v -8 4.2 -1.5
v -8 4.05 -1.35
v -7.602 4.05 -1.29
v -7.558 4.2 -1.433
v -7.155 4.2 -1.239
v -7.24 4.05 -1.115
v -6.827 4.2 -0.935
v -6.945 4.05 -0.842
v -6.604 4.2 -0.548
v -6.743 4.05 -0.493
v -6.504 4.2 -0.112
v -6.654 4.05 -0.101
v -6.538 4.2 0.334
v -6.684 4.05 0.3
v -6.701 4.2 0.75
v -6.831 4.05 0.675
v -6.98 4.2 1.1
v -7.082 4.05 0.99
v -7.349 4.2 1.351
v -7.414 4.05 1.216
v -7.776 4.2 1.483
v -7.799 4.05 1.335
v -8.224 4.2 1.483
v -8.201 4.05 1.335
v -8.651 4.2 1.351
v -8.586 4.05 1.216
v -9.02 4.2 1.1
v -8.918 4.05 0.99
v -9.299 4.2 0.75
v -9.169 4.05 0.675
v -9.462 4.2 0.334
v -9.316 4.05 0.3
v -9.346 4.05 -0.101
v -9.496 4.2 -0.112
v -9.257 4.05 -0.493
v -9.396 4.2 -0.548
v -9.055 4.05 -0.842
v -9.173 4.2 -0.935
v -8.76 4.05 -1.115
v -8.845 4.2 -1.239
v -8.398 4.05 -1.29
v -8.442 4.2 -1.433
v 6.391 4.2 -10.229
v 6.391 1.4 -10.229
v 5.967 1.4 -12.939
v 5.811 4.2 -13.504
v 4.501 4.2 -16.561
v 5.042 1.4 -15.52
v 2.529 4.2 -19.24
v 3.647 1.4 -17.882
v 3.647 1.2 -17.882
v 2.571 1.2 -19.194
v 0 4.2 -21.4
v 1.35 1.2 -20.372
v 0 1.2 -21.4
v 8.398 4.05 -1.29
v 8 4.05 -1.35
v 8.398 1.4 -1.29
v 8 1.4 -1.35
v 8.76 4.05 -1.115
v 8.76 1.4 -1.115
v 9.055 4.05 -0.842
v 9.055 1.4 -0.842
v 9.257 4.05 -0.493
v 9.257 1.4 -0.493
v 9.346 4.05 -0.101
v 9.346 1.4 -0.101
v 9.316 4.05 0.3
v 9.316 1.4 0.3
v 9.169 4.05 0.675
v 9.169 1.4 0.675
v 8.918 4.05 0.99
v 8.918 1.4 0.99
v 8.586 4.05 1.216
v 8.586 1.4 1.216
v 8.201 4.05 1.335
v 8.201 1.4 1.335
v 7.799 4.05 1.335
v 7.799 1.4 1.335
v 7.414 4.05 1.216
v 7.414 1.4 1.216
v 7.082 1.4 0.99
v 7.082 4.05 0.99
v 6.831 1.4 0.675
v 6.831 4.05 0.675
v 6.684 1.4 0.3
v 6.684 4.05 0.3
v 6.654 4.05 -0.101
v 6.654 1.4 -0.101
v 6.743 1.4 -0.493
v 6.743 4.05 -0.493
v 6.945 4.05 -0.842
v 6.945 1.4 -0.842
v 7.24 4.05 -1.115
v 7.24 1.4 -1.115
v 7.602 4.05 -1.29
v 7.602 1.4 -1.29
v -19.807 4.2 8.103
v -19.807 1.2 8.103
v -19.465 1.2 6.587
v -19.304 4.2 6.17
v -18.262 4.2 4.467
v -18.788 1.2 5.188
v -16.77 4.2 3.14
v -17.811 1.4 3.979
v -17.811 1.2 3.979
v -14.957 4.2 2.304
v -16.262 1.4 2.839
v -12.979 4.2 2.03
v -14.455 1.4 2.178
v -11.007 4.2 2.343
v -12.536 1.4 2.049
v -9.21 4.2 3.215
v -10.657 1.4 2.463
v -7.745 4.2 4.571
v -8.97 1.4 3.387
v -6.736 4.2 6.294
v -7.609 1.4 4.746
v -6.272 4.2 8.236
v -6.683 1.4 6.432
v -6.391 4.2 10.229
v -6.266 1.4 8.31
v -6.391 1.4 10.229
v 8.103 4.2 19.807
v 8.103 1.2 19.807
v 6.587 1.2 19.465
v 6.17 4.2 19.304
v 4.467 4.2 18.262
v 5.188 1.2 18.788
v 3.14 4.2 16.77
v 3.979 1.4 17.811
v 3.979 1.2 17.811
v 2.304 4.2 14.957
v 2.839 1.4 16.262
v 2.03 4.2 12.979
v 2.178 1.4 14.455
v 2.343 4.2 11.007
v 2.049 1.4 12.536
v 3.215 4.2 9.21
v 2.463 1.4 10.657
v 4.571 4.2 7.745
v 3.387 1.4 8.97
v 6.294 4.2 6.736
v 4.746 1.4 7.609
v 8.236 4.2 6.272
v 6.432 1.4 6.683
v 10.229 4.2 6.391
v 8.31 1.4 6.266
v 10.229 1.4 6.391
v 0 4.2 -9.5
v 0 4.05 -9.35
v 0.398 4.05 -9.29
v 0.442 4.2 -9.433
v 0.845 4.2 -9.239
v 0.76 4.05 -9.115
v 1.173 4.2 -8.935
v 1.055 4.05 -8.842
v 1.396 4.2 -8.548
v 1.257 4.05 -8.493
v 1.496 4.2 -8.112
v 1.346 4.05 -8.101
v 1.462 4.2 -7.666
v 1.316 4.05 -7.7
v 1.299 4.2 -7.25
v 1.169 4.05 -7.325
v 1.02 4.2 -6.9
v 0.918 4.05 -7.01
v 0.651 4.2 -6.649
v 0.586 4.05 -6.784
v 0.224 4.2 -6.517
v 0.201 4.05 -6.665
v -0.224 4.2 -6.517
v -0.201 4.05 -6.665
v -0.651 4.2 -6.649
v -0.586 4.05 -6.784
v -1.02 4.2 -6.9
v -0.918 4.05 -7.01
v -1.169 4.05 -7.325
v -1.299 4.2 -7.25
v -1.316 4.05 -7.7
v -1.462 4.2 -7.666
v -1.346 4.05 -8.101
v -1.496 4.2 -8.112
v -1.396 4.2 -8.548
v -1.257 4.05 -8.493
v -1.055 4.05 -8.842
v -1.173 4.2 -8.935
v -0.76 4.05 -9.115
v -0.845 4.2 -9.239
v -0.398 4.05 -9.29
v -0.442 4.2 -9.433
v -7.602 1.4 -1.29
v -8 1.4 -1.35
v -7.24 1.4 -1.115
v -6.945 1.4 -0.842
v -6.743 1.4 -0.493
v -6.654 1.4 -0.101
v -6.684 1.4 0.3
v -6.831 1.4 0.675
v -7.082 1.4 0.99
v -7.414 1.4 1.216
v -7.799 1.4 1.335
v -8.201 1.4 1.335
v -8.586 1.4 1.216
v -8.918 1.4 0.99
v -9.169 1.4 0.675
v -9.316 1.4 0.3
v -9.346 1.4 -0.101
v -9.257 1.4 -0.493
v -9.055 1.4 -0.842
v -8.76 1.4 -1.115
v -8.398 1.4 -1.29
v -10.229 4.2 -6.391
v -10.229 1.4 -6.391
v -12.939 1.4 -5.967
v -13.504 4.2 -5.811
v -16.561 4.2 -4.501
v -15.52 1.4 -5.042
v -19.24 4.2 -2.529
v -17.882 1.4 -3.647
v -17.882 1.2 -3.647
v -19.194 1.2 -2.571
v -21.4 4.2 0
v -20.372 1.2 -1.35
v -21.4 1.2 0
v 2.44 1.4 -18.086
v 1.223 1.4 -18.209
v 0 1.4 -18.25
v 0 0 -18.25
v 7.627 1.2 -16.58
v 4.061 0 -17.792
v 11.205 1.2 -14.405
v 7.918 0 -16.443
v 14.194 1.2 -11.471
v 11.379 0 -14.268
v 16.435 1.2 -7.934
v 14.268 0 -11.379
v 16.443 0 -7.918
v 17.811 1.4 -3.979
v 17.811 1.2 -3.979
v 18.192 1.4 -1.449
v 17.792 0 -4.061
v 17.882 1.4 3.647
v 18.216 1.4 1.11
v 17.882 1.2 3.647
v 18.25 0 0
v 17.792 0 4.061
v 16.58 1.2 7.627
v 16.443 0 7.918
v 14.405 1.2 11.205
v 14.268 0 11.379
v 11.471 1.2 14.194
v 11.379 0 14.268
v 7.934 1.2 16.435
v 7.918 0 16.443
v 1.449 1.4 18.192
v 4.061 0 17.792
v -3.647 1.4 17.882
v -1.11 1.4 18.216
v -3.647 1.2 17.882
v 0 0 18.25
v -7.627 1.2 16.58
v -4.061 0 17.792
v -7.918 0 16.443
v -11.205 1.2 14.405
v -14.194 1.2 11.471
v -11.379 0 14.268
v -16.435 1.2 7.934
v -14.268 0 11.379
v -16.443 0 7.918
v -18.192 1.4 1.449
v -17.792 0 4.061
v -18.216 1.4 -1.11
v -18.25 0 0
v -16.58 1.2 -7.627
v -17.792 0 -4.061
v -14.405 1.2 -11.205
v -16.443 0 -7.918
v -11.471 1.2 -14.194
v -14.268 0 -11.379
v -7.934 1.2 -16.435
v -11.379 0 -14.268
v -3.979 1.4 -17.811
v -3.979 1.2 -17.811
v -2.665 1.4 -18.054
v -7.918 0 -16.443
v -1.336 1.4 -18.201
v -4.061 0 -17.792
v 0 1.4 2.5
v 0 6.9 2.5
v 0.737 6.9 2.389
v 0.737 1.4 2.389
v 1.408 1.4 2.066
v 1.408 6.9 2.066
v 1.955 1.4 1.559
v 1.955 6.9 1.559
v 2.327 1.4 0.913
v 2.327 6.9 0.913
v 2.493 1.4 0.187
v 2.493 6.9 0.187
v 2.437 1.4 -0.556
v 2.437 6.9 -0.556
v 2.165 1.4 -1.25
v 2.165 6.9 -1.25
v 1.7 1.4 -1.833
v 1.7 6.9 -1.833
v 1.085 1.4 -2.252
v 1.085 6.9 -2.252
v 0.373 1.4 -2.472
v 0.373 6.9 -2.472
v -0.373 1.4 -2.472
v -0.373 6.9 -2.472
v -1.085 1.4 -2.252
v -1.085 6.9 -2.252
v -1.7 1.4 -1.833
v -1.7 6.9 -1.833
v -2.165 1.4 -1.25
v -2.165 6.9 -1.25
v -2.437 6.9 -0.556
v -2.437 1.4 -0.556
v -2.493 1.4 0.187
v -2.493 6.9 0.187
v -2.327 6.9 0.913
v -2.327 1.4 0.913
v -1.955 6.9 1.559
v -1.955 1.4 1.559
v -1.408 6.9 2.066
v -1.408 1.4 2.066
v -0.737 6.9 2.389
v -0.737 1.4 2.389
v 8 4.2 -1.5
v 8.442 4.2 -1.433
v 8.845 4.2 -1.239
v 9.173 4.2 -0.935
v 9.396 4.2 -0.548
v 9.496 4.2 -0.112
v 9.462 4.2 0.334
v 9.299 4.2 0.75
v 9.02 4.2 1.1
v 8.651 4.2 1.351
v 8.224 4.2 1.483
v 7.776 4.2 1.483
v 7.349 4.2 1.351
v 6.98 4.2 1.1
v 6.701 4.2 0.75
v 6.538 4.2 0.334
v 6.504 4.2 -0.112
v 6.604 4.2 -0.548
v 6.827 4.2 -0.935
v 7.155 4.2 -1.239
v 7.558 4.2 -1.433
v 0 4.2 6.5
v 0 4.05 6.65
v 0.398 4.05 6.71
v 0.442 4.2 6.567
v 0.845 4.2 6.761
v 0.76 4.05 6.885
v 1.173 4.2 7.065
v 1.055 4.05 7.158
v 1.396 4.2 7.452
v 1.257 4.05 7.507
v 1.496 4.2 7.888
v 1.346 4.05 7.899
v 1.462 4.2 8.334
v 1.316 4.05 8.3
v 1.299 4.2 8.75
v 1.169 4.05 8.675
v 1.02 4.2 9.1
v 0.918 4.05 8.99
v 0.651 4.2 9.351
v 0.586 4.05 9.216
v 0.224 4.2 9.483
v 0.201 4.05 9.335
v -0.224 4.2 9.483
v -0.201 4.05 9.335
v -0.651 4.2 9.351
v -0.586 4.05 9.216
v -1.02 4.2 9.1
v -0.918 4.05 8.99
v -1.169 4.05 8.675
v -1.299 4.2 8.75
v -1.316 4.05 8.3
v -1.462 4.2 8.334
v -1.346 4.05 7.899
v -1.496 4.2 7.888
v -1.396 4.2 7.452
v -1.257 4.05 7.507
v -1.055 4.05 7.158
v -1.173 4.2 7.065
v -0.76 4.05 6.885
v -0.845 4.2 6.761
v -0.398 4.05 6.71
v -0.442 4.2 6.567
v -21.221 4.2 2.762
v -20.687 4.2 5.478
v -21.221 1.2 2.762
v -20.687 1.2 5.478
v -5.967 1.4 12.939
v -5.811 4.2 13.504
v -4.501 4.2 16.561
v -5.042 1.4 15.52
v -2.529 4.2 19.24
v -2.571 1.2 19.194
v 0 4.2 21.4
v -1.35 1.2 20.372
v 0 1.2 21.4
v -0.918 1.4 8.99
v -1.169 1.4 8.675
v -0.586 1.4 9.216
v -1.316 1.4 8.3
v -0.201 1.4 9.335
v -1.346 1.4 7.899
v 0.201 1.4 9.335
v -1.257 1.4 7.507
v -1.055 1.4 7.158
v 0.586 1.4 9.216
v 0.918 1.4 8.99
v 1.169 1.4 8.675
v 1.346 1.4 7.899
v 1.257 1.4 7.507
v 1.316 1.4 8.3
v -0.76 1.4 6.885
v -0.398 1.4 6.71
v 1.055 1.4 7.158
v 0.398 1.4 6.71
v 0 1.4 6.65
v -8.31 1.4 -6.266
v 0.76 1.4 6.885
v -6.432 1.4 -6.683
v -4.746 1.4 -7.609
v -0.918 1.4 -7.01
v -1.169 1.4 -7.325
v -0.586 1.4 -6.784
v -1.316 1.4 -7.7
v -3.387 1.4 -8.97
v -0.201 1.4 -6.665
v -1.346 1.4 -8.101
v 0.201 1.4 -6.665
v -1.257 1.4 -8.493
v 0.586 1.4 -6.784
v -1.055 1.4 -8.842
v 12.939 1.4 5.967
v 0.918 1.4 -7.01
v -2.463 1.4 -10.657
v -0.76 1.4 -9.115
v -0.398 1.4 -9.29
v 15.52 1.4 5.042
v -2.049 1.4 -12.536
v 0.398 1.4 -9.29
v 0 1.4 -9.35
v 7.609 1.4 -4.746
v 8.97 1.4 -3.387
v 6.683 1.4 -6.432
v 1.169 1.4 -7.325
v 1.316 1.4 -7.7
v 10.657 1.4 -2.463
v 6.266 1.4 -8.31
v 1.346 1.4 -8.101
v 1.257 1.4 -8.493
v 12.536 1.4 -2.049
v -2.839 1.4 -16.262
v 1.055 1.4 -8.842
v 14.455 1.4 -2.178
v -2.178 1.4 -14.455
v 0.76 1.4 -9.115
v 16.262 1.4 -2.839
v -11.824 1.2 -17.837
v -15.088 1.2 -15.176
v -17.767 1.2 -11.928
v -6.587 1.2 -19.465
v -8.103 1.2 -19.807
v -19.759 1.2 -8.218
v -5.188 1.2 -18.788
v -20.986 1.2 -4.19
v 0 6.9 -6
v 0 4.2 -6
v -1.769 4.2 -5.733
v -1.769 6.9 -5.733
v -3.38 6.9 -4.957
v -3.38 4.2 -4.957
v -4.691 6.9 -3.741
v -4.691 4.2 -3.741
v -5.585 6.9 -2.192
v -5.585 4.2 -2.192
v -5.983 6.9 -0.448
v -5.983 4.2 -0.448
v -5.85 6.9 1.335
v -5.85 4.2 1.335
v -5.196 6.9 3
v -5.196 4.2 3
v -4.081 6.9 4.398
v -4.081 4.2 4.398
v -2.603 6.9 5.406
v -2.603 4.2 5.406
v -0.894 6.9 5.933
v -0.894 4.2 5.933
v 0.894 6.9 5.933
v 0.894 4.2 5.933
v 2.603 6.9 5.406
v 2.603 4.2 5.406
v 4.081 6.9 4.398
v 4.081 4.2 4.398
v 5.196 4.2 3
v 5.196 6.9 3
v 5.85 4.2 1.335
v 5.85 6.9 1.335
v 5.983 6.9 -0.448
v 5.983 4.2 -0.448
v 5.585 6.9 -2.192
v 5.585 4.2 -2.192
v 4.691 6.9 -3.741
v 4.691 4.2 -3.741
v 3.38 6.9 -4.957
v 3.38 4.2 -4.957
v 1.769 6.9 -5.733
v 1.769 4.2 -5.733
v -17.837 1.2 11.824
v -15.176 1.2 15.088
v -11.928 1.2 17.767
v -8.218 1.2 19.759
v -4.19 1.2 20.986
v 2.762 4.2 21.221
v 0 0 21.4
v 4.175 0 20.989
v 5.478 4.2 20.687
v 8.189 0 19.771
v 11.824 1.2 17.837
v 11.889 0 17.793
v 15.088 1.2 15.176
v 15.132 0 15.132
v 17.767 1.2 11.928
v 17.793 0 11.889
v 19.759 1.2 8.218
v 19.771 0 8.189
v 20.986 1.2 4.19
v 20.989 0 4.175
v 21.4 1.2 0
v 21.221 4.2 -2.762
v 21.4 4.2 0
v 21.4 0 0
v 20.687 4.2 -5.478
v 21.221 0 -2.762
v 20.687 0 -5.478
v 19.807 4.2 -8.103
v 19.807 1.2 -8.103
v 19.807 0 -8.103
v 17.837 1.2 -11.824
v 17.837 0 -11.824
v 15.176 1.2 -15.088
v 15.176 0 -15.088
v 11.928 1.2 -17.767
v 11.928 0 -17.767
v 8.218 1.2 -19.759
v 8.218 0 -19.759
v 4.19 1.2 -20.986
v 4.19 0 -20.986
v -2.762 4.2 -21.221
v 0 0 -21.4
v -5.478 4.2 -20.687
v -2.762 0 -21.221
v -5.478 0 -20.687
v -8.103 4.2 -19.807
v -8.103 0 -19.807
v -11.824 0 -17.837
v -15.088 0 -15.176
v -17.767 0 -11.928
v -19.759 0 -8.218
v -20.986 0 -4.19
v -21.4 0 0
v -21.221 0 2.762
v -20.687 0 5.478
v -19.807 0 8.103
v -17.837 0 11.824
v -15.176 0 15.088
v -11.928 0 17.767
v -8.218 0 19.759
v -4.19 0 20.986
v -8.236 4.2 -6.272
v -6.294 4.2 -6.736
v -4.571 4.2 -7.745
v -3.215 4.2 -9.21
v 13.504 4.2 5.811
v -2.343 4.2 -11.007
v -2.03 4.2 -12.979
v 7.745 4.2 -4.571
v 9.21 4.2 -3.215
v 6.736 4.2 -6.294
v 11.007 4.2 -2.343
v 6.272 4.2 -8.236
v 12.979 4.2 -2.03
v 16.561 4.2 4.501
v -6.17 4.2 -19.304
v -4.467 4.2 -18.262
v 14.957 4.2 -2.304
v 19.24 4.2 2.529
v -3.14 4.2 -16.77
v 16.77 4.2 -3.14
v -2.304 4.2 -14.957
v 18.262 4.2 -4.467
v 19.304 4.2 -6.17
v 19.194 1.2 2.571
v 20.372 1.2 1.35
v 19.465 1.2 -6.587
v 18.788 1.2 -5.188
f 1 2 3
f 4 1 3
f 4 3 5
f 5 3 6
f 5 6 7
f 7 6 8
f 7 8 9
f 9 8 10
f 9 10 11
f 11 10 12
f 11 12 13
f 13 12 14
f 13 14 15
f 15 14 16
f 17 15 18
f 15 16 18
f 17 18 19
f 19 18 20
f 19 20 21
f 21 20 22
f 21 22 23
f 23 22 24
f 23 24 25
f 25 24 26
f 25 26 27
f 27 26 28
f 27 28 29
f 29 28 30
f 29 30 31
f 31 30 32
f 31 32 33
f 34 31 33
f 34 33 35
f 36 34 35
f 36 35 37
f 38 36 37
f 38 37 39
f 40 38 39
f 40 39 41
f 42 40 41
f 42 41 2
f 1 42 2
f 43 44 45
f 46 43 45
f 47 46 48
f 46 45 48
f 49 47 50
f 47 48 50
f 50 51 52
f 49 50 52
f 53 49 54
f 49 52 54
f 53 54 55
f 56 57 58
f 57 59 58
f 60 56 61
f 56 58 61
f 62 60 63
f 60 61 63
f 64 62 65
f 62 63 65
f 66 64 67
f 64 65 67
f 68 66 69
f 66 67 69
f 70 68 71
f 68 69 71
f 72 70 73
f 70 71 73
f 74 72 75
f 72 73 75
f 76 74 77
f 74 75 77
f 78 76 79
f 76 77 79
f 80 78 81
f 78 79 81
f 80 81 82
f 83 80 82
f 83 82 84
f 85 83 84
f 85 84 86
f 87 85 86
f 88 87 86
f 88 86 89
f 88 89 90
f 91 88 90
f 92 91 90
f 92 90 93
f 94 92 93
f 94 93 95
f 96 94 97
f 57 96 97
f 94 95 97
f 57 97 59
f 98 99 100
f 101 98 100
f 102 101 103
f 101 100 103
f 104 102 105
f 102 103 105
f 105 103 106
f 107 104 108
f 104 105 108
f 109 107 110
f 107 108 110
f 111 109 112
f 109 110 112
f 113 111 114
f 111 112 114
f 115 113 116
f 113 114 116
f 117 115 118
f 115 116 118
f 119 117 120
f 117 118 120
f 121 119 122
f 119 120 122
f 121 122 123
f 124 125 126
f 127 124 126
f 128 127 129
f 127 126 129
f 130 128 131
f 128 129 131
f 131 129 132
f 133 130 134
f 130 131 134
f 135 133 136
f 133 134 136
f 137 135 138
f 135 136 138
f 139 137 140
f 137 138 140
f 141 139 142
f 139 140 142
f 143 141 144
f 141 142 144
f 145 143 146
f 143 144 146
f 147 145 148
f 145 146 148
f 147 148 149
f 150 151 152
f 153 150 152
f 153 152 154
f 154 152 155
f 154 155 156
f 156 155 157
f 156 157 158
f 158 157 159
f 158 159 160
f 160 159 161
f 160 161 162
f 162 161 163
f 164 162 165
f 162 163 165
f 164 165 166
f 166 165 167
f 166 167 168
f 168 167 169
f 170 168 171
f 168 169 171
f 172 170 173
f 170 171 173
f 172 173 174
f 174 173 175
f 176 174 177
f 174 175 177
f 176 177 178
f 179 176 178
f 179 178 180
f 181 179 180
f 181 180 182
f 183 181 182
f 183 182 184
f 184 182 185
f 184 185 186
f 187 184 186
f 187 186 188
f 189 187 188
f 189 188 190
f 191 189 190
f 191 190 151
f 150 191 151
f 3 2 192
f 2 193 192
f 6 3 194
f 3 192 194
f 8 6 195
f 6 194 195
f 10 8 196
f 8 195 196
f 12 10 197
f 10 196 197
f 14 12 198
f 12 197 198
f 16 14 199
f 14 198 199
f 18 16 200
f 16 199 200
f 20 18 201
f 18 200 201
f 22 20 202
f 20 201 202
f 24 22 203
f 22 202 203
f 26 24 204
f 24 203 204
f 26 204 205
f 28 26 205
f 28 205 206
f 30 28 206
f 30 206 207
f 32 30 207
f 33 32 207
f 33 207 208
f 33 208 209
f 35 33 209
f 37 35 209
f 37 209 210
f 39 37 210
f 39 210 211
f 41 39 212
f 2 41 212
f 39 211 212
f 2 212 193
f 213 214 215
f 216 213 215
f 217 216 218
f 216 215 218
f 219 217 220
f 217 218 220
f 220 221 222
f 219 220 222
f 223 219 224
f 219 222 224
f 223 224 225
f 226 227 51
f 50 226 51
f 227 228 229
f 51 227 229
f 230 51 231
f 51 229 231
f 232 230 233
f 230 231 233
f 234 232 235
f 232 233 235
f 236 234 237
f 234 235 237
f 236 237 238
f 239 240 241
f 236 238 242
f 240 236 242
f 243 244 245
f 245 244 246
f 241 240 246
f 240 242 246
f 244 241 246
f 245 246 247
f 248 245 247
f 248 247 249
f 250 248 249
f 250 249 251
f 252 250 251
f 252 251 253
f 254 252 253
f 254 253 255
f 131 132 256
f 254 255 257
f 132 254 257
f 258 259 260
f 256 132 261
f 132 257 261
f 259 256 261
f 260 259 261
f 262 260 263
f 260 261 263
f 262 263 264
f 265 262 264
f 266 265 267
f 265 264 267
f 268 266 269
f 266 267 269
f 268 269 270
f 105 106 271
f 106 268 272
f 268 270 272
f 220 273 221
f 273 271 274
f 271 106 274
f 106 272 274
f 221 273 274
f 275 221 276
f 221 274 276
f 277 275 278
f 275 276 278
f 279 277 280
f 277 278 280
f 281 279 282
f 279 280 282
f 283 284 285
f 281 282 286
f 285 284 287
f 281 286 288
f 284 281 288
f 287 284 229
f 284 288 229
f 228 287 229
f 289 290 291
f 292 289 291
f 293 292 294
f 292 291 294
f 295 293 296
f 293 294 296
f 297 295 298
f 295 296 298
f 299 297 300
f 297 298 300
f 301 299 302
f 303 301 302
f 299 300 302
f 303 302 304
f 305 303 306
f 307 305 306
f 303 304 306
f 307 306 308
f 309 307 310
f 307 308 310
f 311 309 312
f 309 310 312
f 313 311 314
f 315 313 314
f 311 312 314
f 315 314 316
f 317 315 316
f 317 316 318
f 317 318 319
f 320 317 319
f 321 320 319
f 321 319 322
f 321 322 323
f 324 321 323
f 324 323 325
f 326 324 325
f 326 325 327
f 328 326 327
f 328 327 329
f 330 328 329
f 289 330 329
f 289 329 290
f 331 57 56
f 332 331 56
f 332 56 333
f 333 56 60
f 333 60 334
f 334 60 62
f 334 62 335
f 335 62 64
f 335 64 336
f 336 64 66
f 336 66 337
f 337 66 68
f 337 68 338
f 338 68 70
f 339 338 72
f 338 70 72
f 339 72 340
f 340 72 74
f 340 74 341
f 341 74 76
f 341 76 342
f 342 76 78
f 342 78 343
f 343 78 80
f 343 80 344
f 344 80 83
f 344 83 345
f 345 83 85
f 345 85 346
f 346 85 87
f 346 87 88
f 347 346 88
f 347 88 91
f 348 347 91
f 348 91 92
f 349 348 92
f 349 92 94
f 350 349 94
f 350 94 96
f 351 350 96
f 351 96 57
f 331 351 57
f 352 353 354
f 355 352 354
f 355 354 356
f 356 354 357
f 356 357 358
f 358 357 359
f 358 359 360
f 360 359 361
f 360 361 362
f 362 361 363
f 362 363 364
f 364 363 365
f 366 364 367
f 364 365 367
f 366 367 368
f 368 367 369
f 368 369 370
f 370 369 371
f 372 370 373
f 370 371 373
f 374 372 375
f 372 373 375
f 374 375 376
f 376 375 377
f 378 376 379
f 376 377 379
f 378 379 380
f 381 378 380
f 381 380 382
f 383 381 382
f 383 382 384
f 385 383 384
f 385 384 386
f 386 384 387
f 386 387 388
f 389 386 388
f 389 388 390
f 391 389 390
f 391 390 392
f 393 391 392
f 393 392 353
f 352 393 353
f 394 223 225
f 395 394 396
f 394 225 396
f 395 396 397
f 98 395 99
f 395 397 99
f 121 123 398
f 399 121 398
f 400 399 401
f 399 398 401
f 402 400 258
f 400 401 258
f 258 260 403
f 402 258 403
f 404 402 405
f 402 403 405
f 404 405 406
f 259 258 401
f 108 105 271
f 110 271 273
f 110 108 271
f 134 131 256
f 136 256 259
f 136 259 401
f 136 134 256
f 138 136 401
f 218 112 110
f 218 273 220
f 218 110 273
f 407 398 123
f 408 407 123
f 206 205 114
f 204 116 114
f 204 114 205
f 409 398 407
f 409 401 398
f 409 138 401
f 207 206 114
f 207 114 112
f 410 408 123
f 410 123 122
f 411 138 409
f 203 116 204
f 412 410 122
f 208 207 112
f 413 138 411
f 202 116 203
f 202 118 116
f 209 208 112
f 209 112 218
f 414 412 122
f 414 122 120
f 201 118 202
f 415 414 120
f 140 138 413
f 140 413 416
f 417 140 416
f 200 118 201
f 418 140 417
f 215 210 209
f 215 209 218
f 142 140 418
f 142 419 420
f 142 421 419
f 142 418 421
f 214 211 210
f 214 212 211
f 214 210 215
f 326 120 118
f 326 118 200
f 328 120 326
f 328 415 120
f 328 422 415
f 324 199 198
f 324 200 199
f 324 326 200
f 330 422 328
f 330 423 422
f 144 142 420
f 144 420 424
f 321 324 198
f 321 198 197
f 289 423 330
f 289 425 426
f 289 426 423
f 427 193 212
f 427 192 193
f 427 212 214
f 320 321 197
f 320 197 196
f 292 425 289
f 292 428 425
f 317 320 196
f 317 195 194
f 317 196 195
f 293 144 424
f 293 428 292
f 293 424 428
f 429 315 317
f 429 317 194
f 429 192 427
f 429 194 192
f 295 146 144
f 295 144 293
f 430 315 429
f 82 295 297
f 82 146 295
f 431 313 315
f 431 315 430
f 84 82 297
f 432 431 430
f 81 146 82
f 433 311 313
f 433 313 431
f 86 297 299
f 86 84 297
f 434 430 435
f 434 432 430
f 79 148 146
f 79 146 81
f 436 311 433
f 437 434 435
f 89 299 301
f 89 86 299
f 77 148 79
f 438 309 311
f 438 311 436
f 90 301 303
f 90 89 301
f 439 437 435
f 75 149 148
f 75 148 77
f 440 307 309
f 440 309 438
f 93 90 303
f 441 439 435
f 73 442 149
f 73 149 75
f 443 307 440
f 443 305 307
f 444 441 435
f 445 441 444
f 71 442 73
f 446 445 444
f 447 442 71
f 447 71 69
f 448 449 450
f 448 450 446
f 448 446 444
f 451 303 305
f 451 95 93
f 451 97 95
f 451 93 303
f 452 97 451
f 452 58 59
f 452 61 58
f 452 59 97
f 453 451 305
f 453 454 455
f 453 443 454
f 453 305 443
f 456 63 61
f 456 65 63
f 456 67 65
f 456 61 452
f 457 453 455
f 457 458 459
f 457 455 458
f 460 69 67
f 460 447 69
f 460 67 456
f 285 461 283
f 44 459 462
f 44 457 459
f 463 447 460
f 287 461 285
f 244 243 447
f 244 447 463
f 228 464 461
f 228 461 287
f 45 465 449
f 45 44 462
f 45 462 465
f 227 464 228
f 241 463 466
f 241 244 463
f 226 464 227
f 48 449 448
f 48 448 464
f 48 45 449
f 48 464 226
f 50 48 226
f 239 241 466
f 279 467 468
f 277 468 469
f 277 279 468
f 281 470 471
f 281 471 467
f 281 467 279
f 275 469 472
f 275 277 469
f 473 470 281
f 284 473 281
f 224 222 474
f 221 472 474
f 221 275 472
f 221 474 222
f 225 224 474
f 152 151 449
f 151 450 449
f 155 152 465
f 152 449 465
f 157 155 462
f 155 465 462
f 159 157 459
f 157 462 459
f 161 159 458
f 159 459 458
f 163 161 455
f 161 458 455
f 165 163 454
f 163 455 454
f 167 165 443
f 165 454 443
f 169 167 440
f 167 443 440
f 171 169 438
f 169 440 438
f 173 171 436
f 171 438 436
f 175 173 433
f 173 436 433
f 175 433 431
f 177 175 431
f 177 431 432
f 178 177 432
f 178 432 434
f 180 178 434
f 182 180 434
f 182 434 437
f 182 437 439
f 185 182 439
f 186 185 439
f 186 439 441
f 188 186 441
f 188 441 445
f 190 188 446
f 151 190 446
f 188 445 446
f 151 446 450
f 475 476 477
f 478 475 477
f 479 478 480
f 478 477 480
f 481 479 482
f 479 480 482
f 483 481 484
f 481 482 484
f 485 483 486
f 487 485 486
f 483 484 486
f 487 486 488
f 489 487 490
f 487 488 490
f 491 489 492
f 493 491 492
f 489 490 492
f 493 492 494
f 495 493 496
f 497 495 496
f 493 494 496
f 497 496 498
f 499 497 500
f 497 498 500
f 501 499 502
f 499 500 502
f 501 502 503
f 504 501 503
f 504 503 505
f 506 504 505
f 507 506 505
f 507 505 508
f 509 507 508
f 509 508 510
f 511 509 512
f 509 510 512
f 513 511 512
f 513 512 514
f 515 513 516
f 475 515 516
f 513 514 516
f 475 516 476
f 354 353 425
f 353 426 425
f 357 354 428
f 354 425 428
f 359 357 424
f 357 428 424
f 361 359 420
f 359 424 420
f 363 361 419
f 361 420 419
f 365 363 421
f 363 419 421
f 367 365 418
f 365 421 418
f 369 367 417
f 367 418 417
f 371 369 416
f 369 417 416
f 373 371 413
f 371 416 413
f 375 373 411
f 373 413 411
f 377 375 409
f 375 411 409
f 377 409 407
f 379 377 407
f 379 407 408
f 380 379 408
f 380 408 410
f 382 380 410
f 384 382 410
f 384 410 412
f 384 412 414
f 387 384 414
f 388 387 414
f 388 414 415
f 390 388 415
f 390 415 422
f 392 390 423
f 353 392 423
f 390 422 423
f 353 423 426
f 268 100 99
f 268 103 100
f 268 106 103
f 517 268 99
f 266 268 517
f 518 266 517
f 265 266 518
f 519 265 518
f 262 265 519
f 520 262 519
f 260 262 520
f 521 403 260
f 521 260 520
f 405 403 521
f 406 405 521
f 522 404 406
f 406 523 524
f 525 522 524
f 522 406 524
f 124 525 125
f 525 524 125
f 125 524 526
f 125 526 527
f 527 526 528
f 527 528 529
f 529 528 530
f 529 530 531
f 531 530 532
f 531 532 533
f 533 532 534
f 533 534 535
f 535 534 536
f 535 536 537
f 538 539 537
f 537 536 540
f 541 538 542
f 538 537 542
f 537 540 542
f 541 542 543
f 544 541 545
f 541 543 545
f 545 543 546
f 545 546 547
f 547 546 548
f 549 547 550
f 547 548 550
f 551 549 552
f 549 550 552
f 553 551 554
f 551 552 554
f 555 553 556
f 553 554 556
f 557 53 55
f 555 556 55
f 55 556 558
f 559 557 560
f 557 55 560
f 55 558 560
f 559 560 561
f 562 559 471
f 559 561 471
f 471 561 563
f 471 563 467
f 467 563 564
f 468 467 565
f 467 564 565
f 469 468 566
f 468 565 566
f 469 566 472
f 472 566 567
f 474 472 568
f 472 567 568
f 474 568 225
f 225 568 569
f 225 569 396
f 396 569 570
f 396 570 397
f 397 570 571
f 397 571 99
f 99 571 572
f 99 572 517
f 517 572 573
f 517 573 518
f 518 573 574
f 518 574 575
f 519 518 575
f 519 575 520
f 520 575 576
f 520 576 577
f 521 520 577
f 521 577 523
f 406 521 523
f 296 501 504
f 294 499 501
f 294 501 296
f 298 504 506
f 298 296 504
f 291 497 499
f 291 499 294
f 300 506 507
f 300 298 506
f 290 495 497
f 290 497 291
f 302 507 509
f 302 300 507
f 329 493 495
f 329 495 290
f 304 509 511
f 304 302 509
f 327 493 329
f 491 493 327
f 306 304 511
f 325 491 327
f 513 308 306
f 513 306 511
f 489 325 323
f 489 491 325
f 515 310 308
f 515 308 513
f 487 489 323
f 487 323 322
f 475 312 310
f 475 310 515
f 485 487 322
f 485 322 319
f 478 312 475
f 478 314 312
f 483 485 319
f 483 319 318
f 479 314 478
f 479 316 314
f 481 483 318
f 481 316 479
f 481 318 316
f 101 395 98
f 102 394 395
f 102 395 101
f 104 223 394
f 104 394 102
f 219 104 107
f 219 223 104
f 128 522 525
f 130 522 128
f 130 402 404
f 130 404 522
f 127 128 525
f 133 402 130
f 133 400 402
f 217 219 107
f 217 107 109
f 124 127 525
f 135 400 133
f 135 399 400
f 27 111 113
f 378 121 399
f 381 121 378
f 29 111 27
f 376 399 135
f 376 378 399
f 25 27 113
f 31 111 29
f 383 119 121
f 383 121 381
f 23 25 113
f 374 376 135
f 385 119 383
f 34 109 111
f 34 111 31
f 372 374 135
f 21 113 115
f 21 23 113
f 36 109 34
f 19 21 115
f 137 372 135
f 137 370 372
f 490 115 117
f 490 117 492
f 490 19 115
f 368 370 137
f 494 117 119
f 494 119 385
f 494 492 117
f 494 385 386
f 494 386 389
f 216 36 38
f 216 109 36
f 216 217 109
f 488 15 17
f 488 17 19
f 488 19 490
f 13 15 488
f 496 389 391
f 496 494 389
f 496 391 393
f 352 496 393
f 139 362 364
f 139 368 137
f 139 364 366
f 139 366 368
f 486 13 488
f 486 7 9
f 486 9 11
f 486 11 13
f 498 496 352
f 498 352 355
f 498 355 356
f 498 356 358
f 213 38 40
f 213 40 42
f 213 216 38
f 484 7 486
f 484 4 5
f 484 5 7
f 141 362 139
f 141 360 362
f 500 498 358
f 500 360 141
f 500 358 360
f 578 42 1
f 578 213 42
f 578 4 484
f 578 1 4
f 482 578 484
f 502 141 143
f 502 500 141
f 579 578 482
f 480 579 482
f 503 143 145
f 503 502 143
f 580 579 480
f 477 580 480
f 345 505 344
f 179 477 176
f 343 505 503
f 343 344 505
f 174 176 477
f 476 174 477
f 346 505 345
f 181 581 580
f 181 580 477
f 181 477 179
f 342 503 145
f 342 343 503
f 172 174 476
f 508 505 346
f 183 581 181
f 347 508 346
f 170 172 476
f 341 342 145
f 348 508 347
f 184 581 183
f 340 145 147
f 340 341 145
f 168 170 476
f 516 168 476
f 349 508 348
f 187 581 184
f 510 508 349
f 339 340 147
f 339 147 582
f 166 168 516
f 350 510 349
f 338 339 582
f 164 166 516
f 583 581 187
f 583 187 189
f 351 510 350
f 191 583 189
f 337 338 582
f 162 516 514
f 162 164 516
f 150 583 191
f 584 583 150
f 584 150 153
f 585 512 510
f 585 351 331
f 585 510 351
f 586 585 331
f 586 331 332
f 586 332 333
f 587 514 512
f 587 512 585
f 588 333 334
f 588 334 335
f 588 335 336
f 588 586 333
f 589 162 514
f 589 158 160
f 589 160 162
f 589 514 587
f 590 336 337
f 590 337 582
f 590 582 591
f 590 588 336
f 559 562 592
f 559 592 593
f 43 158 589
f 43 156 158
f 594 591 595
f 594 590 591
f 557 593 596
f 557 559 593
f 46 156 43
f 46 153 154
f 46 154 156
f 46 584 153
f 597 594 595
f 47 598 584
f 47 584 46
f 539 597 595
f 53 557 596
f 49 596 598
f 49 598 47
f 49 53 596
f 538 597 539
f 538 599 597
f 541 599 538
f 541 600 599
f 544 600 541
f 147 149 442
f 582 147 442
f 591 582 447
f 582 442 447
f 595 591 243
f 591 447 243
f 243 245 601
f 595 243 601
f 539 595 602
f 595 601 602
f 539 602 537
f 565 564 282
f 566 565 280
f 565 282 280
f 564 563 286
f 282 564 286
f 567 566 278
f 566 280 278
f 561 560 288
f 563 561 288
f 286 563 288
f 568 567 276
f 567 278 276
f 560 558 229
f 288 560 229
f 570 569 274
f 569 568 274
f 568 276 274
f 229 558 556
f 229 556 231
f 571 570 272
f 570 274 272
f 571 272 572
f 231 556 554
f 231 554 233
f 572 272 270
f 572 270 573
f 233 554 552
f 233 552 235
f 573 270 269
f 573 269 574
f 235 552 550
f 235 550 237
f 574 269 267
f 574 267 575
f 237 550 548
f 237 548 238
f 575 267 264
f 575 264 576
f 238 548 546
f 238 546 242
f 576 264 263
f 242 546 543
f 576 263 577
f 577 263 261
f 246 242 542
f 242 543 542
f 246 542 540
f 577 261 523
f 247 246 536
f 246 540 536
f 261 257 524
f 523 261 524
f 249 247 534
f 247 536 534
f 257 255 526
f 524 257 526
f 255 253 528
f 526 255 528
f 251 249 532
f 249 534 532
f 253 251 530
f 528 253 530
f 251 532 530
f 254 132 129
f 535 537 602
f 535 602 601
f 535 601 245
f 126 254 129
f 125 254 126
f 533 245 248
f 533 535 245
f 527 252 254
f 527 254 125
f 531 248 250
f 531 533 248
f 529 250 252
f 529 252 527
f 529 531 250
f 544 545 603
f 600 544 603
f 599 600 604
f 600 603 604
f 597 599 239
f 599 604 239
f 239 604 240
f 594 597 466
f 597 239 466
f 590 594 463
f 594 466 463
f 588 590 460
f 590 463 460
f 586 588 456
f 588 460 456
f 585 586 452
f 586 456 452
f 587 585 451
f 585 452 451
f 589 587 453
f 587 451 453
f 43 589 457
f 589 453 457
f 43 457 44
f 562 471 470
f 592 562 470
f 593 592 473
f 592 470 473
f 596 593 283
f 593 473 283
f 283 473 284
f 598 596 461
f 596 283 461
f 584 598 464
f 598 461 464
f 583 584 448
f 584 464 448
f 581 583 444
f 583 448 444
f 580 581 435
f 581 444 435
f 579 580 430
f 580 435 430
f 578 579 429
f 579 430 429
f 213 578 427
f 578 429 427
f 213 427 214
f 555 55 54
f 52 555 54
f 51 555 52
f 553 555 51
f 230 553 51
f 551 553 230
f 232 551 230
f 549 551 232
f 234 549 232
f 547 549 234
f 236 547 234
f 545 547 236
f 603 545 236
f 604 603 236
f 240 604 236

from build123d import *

# Parameters (mm, degrees)
SKETCH_4_R                = 21.4
EXTRUDE_2_DEPTH           = 1.2
EXTRUDE_5_DEPTH           = 4.2
SKETCH_7_R                = 18.25
CUT_EXTRUDE_2_DEPTH       = 1.4
SKETCH_9_R                = 6
EXTRUDE_6_DEPTH           = 2.7
SKETCH_10_R               = 2.5
CUT_EXTRUDE_3_DEPTH       = 32.040779629
HOLE_WIZARD_1_D           = 2.7
HOLE_WIZARD_1_CSINK_D     = 3
HOLE_WIZARD_1_CSINK_ANGLE = 90


with BuildPart() as part:
    # 草图4 → 凸台-拉伸2 (new body)
    with BuildSketch(Plane(origin=(0, 0, 0), x_dir=(1, 0, 0), z_dir=(0, 1, 0))):
        with Locations(Location((0, 0, 0), (0, 0, 270))):
            Circle(SKETCH_4_R)
    extrude(amount=EXTRUDE_2_DEPTH)

    # 草图5 → 凸台-拉伸5 (add)
    with BuildSketch(Plane(origin=(0, 0, 0), x_dir=(1, 0, 0), z_dir=(0, 1, 0))):
        with BuildLine():
            ThreePointArc((0, 21.4), (-4.129005127, 20.997888386), (-8.102840074, 19.806665109))
            ThreePointArc((-8.102840074, 19.806665109), (-2.113798114, 11.981054753), (-10.229363001, 6.391206133))
            ThreePointArc((-10.229363001, 6.391206133), (-16.561312382, 4.500574676), (-21.4, 0))
            ThreePointArc((-21.4, 0), (-20.997888386, -4.129005127), (-19.806665109, -8.102840074))
            ThreePointArc((-19.806665109, -8.102840074), (-11.981054753, -2.113798114), (-6.391206133, -10.229363001))
            ThreePointArc((-6.391206133, -10.229363001), (-4.500574676, -16.561312382), (0, -21.4))
            ThreePointArc((0, -21.4), (4.129005127, -20.997888386), (8.102840074, -19.806665109))
            ThreePointArc((8.102840074, -19.806665109), (2.113798114, -11.981054753), (10.229363001, -6.391206133))
            ThreePointArc((10.229363001, -6.391206133), (16.561312382, -4.500574676), (21.4, 0))
            ThreePointArc((21.4, 0), (20.997888386, 4.129005127), (19.806665109, 8.102840074))
            ThreePointArc((19.806665109, 8.102840074), (11.981054753, 2.113798114), (6.391206133, 10.229363001))
            ThreePointArc((6.391206133, 10.229363001), (4.500574676, 16.561312382), (0, 21.4))
        make_face()
    extrude(amount=EXTRUDE_5_DEPTH)

    # 草图7 → 切除-拉伸2 (cut)
    with BuildSketch(Plane.XZ):
        with Locations(Location((0, 0, 0), (0, 0, 270))):
            Circle(SKETCH_7_R)
    extrude(amount=-CUT_EXTRUDE_2_DEPTH, mode=Mode.SUBTRACT)

    # 草图9 → 凸台-拉伸6 (add)
    with BuildSketch(Plane(origin=(0, 4.2, 0), x_dir=(1, 0, 0), z_dir=(0, 1, 0))):
        with Locations(Location((0, 0, 0), (0, 0, 90))):
            Circle(SKETCH_9_R)
    extrude(amount=EXTRUDE_6_DEPTH)

    # 草图10 → 切除-拉伸3 (cut, through all)
    with BuildSketch(Plane(origin=(0, 6.9, 0), x_dir=(1, 0, 0), z_dir=(0, 1, 0))):
        with Locations(Location((0, 0, 0), (0, 0, 270))):
            Circle(SKETCH_10_R)
    extrude(amount=-CUT_EXTRUDE_3_DEPTH, mode=Mode.SUBTRACT)

    # 打孔尺寸(%根据)内六角花形半沉头螺钉的类型1 (through all)
    with Locations(Plane(origin=(-8, 4.2, 0), x_dir=(0, 0, 1), z_dir=(0, 1, 0))):
        with Locations((0, 0), (-8, 8), (0, 16), (8, 8)):
            CounterSinkHole(HOLE_WIZARD_1_D / 2, HOLE_WIZARD_1_CSINK_D / 2, counter_sink_angle=HOLE_WIZARD_1_CSINK_ANGLE)


solid = part.part
